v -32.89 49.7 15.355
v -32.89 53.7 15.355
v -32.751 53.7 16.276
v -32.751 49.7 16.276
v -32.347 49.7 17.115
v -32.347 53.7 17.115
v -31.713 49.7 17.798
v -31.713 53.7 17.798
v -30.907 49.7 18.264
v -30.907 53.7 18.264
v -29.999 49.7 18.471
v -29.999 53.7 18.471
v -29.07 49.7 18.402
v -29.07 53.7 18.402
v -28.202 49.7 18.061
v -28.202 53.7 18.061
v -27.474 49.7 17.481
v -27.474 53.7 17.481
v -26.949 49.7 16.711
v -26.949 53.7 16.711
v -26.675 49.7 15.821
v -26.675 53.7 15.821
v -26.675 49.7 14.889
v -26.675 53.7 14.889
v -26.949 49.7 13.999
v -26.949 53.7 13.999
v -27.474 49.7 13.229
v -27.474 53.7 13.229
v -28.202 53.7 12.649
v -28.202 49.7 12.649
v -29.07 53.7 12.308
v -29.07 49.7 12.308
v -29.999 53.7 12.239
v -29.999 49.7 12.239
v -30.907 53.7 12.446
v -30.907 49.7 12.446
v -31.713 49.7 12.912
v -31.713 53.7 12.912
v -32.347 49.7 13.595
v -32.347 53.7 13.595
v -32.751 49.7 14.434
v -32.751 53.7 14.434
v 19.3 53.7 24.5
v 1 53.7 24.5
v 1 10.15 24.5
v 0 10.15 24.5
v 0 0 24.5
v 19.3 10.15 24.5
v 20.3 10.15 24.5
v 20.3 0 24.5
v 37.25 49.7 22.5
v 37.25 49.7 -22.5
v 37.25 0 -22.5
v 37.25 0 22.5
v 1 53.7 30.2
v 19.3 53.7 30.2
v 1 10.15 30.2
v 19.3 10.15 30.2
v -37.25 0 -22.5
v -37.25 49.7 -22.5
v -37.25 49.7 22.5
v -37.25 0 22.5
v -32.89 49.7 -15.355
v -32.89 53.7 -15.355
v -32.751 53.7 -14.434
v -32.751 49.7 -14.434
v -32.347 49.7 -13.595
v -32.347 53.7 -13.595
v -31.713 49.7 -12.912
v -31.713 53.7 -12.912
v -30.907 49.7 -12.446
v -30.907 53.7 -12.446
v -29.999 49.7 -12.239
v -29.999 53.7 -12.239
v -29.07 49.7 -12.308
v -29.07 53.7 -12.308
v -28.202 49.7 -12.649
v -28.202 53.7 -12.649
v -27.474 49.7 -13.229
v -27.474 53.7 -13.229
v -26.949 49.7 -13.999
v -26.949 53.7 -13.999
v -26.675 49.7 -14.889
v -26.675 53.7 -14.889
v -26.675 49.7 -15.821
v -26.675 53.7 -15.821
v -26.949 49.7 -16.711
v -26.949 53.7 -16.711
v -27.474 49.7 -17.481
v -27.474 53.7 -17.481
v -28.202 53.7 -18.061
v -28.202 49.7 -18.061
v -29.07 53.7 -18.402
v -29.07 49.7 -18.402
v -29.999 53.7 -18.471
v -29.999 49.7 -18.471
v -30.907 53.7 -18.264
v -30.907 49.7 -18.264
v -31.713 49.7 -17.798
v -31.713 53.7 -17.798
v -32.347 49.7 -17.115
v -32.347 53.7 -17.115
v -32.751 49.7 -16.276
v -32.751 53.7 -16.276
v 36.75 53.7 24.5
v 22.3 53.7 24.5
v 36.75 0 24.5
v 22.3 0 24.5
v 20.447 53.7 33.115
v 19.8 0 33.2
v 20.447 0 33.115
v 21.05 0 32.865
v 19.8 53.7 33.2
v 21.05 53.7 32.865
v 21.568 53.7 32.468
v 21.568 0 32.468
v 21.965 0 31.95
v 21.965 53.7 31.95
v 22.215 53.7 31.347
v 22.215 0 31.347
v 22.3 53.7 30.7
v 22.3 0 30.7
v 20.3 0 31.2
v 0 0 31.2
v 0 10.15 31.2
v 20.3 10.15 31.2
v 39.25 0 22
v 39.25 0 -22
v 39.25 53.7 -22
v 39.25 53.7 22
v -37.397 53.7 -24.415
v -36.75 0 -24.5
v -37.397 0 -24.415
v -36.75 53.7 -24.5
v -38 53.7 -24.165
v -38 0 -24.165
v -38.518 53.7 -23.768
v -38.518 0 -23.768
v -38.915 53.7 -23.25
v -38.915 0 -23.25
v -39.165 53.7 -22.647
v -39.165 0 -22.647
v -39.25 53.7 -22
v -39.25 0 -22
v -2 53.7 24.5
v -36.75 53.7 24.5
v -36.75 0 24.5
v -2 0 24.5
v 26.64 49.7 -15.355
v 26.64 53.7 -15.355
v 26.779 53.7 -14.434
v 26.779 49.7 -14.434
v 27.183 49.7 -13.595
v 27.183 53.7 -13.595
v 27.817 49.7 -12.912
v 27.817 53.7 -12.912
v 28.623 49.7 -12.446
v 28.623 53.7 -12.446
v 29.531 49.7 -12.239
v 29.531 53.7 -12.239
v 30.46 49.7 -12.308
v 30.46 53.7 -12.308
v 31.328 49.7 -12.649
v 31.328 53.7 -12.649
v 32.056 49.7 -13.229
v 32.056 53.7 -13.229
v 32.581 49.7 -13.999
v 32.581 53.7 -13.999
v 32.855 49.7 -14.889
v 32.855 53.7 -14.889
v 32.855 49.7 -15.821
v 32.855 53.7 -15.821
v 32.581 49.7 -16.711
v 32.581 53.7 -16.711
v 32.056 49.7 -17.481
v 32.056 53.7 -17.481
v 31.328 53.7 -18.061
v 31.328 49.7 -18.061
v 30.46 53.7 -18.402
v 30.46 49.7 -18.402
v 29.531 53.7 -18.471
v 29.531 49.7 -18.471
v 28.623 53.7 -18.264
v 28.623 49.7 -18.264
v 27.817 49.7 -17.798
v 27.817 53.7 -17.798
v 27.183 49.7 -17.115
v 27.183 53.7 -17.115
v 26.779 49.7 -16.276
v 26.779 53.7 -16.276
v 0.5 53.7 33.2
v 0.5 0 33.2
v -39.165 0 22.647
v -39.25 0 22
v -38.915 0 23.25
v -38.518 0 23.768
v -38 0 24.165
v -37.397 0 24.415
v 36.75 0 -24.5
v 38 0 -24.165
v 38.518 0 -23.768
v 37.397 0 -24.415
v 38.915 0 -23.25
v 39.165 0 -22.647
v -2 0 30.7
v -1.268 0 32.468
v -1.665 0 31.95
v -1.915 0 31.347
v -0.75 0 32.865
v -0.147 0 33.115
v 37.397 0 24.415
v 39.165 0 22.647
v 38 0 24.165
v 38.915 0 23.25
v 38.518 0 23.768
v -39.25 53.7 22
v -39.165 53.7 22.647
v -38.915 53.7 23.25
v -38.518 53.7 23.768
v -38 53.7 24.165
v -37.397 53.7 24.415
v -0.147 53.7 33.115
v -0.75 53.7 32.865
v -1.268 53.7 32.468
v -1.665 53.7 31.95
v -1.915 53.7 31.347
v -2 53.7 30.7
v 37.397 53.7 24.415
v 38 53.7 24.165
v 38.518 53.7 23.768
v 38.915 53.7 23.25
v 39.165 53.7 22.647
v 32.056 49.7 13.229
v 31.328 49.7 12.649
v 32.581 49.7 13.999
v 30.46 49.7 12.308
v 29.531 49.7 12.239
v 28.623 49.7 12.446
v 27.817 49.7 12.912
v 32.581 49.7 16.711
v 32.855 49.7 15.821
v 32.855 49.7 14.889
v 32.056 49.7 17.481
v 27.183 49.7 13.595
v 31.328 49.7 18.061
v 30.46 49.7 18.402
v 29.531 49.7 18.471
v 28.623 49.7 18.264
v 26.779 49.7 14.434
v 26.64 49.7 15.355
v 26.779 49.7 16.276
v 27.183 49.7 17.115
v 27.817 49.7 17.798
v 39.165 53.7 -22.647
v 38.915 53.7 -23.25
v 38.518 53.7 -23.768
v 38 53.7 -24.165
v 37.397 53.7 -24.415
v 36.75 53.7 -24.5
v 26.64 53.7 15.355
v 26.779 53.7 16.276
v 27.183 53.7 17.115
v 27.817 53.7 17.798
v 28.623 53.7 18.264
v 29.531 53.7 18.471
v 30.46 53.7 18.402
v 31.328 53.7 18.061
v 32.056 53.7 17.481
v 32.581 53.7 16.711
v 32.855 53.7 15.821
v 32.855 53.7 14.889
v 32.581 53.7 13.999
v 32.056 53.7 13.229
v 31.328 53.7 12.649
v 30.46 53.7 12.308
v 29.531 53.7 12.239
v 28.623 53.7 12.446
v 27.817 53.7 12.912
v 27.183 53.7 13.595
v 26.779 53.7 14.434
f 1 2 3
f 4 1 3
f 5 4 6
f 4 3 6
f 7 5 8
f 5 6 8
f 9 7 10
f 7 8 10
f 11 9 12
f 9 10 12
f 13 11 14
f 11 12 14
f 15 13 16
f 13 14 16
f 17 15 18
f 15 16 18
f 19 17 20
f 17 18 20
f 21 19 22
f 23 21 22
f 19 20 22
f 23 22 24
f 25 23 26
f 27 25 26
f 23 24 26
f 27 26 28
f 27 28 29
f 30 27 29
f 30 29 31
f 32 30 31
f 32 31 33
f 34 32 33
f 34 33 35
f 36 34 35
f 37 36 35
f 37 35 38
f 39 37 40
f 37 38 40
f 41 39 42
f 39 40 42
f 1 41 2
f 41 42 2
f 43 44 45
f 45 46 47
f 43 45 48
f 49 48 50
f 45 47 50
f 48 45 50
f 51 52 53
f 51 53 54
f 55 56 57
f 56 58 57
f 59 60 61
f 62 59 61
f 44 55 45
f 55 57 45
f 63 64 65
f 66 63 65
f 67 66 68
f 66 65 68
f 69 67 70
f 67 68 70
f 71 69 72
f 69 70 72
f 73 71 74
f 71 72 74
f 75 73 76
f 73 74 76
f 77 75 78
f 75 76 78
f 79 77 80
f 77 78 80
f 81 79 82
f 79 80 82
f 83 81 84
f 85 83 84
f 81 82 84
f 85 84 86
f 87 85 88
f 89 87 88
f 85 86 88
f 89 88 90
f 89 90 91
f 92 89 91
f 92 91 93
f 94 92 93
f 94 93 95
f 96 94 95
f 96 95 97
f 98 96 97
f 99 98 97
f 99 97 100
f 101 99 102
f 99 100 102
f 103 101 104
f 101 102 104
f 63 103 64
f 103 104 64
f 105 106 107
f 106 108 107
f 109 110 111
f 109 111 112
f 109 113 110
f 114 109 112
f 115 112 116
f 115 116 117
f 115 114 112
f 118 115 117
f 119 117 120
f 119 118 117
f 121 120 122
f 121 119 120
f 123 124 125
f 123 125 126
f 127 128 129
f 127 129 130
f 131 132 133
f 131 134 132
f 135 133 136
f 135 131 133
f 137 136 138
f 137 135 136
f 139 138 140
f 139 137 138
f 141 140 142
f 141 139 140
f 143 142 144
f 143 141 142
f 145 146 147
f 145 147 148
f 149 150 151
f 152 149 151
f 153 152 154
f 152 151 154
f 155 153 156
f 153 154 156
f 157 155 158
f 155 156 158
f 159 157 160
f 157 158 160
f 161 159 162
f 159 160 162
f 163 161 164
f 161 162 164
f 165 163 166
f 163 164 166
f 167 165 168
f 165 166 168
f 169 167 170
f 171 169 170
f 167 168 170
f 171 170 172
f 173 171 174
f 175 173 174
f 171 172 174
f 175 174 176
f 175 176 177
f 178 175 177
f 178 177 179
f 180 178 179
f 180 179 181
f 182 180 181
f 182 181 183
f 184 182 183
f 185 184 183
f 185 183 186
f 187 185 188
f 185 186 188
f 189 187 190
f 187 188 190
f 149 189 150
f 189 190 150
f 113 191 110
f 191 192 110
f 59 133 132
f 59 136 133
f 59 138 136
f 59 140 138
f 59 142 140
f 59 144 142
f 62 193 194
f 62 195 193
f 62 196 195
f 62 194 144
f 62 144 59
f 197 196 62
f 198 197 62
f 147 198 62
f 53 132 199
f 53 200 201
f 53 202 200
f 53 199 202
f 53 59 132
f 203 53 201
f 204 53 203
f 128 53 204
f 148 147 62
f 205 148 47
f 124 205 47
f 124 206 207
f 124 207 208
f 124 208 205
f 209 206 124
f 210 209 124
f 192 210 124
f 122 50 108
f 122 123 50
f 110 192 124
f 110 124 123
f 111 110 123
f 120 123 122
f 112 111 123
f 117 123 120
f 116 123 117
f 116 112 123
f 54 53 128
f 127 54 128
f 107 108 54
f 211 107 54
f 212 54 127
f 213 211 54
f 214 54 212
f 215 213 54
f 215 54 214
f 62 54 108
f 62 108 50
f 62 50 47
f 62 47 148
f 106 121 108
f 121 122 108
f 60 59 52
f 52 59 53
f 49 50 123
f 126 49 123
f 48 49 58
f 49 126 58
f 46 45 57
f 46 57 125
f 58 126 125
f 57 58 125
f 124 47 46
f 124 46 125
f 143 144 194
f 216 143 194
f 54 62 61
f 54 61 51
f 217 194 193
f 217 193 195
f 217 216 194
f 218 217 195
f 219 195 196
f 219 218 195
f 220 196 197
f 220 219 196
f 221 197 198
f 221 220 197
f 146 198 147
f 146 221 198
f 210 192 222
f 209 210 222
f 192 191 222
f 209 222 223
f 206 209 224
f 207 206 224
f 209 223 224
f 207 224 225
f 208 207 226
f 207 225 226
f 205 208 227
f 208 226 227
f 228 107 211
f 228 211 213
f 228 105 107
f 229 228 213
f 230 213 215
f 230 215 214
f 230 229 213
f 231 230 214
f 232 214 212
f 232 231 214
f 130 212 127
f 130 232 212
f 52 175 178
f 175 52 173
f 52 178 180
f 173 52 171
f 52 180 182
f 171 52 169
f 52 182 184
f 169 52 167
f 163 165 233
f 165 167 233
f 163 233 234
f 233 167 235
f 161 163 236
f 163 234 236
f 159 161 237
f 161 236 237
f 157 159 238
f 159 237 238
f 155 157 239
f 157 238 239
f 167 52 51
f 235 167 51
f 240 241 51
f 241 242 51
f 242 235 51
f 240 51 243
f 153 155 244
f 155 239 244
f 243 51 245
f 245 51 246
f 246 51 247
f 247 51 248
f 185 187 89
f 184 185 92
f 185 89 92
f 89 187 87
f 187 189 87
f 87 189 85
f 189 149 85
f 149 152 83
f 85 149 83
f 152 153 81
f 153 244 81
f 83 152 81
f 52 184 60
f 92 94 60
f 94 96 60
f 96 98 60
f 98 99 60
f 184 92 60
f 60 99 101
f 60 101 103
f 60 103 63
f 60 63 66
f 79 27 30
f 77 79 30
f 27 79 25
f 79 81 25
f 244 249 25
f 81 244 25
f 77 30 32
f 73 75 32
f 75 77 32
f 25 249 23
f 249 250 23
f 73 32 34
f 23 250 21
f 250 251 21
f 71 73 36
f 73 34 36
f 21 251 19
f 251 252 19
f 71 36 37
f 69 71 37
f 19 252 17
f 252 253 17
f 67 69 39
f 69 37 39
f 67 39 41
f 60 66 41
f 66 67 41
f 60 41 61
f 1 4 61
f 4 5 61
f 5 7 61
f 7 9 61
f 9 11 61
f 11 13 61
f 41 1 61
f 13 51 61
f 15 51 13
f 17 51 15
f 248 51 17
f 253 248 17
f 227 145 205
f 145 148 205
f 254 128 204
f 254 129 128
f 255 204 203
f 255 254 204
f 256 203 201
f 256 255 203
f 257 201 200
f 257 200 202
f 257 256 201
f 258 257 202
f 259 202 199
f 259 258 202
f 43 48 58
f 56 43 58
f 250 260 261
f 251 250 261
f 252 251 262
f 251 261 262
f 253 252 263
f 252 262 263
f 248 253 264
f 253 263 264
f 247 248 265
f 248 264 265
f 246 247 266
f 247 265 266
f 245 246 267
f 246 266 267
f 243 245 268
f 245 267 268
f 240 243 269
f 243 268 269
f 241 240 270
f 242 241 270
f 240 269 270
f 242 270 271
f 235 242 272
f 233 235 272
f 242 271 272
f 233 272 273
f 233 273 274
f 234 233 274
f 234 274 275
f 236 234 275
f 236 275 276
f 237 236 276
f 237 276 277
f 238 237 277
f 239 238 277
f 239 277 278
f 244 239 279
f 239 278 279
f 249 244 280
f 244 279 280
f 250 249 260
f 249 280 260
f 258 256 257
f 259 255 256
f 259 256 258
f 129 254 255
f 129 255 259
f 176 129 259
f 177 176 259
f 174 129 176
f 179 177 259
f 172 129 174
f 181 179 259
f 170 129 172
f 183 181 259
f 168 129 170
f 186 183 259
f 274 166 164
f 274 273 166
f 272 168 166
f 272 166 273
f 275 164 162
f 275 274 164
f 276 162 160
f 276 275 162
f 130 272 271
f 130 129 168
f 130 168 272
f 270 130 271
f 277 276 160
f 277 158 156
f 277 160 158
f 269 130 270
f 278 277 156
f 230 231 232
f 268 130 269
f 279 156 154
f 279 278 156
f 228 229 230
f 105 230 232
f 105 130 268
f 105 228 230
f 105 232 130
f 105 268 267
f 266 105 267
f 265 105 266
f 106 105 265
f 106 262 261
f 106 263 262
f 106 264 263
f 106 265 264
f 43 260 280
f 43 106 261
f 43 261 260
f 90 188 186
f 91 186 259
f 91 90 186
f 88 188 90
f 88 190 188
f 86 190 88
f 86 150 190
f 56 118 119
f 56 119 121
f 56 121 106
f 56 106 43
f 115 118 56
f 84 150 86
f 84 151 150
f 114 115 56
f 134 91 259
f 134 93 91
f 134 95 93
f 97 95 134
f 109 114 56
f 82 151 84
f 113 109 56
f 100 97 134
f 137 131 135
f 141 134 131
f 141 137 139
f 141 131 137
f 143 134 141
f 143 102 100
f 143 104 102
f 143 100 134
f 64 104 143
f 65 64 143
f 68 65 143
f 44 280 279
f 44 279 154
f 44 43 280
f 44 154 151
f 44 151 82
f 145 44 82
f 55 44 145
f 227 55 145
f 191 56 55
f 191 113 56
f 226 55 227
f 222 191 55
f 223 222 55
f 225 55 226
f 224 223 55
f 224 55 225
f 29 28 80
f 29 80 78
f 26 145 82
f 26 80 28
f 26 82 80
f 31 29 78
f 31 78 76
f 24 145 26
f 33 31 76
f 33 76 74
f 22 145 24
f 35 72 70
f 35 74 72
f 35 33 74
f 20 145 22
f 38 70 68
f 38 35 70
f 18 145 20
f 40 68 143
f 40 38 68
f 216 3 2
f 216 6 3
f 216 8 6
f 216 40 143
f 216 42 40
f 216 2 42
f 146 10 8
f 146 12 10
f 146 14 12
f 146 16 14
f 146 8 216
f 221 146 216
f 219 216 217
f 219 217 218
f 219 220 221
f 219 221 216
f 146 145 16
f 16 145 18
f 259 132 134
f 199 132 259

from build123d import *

# Parameters (mm, degrees)
F0_W      = 78.5
F0_H      = 49
F0_W_2    = 74.5
F0_H_2    = 45
F1_DEPTH  = 53.7
F2_W      = 24.3
F2_H      = 10.7
F2_W_2    = 20.3
F2_H_2    = 6.7
F3_DEPTH  = 11.15
F5_DEPTH  = 1
F6_W      = 74.5
F6_H      = 45
F6_R      = 3.125
F7_DEPTH  = 4
F10_DEPTH = 42.55
F11_R     = 2.5


with BuildPart() as f1:
    # F0 (on Front) → F1 (new body)
    with BuildSketch(Plane.XZ):
        Rectangle(F0_W, F0_H)
        Rectangle(F0_W_2, F0_H_2, mode=Mode.SUBTRACT)
    extrude(amount=-F1_DEPTH)

    # F2 (on Front) → F3 (join)
    with BuildSketch(Plane.XZ):
        with Locations((10.15, 27.85)):
            Rectangle(F2_W, F2_H)
        with Locations((10.15, 27.85)):
            Rectangle(F2_W_2, F2_H_2, mode=Mode.SUBTRACT)
    extrude(amount=-F3_DEPTH)

    # F4 (on face) → F5 (join)
    with BuildSketch(Plane(origin=(0, 11.15, 0), x_dir=(-1, 0, 0), z_dir=(0, 1, 0))):
        Polygon((-20.3, 24.5), (-19.3, 24.5), (-19.3, 30.2), (-1, 30.2), (-1, 24.5), (0, 24.5), (0, 31.2), (-20.3, 31.2), align=None)
    extrude(amount=-F5_DEPTH)


with BuildPart() as f7:
    # F6 (on face) → F7 (new body)
    with BuildSketch(Plane(origin=(0, 53.7, 0), x_dir=(-1, 0, 0), z_dir=(0, 1, 0))):
        Rectangle(F6_W, F6_H)
        with Locations((-29.765, -15.355)):
            Circle(F6_R, mode=Mode.SUBTRACT)
        with Locations((29.765, -15.355)):
            Circle(F6_R, mode=Mode.SUBTRACT)
        with Locations((-29.765, 15.355)):
            Circle(F6_R, mode=Mode.SUBTRACT)
        with Locations((29.765, 15.355)):
            Circle(F6_R, mode=Mode.SUBTRACT)
    extrude(amount=-F7_DEPTH)

    # F8: union F1
    add(f1.part)

    # F9 (on face) → F10 (join, through all)
    with BuildSketch(Plane(origin=(0, 11.15, 0), x_dir=(-1, 0, 0), z_dir=(0, 1, 0))):
        Polygon((-22.3, 24.5), (-19.3, 24.5), (-19.3, 30.2), (-1, 30.2), (-1, 24.5), (2, 24.5), (2, 33.2), (-22.3, 33.2), align=None)
    extrude(amount=F10_DEPTH)

    # F11
    f11_edges = [f7.edges().sort_by_distance(p)[0] for p in [
        (22.3, 26.85, 33.2),
        (-2, 26.85, 33.2),
        (39.25, 26.85, 24.5),
        (39.25, 26.85, -24.5),
        (-39.25, 26.85, 24.5),
        (-39.25, 26.85, -24.5),
    ]]
    fillet(f11_edges, radius=F11_R)


solid = f7.part
